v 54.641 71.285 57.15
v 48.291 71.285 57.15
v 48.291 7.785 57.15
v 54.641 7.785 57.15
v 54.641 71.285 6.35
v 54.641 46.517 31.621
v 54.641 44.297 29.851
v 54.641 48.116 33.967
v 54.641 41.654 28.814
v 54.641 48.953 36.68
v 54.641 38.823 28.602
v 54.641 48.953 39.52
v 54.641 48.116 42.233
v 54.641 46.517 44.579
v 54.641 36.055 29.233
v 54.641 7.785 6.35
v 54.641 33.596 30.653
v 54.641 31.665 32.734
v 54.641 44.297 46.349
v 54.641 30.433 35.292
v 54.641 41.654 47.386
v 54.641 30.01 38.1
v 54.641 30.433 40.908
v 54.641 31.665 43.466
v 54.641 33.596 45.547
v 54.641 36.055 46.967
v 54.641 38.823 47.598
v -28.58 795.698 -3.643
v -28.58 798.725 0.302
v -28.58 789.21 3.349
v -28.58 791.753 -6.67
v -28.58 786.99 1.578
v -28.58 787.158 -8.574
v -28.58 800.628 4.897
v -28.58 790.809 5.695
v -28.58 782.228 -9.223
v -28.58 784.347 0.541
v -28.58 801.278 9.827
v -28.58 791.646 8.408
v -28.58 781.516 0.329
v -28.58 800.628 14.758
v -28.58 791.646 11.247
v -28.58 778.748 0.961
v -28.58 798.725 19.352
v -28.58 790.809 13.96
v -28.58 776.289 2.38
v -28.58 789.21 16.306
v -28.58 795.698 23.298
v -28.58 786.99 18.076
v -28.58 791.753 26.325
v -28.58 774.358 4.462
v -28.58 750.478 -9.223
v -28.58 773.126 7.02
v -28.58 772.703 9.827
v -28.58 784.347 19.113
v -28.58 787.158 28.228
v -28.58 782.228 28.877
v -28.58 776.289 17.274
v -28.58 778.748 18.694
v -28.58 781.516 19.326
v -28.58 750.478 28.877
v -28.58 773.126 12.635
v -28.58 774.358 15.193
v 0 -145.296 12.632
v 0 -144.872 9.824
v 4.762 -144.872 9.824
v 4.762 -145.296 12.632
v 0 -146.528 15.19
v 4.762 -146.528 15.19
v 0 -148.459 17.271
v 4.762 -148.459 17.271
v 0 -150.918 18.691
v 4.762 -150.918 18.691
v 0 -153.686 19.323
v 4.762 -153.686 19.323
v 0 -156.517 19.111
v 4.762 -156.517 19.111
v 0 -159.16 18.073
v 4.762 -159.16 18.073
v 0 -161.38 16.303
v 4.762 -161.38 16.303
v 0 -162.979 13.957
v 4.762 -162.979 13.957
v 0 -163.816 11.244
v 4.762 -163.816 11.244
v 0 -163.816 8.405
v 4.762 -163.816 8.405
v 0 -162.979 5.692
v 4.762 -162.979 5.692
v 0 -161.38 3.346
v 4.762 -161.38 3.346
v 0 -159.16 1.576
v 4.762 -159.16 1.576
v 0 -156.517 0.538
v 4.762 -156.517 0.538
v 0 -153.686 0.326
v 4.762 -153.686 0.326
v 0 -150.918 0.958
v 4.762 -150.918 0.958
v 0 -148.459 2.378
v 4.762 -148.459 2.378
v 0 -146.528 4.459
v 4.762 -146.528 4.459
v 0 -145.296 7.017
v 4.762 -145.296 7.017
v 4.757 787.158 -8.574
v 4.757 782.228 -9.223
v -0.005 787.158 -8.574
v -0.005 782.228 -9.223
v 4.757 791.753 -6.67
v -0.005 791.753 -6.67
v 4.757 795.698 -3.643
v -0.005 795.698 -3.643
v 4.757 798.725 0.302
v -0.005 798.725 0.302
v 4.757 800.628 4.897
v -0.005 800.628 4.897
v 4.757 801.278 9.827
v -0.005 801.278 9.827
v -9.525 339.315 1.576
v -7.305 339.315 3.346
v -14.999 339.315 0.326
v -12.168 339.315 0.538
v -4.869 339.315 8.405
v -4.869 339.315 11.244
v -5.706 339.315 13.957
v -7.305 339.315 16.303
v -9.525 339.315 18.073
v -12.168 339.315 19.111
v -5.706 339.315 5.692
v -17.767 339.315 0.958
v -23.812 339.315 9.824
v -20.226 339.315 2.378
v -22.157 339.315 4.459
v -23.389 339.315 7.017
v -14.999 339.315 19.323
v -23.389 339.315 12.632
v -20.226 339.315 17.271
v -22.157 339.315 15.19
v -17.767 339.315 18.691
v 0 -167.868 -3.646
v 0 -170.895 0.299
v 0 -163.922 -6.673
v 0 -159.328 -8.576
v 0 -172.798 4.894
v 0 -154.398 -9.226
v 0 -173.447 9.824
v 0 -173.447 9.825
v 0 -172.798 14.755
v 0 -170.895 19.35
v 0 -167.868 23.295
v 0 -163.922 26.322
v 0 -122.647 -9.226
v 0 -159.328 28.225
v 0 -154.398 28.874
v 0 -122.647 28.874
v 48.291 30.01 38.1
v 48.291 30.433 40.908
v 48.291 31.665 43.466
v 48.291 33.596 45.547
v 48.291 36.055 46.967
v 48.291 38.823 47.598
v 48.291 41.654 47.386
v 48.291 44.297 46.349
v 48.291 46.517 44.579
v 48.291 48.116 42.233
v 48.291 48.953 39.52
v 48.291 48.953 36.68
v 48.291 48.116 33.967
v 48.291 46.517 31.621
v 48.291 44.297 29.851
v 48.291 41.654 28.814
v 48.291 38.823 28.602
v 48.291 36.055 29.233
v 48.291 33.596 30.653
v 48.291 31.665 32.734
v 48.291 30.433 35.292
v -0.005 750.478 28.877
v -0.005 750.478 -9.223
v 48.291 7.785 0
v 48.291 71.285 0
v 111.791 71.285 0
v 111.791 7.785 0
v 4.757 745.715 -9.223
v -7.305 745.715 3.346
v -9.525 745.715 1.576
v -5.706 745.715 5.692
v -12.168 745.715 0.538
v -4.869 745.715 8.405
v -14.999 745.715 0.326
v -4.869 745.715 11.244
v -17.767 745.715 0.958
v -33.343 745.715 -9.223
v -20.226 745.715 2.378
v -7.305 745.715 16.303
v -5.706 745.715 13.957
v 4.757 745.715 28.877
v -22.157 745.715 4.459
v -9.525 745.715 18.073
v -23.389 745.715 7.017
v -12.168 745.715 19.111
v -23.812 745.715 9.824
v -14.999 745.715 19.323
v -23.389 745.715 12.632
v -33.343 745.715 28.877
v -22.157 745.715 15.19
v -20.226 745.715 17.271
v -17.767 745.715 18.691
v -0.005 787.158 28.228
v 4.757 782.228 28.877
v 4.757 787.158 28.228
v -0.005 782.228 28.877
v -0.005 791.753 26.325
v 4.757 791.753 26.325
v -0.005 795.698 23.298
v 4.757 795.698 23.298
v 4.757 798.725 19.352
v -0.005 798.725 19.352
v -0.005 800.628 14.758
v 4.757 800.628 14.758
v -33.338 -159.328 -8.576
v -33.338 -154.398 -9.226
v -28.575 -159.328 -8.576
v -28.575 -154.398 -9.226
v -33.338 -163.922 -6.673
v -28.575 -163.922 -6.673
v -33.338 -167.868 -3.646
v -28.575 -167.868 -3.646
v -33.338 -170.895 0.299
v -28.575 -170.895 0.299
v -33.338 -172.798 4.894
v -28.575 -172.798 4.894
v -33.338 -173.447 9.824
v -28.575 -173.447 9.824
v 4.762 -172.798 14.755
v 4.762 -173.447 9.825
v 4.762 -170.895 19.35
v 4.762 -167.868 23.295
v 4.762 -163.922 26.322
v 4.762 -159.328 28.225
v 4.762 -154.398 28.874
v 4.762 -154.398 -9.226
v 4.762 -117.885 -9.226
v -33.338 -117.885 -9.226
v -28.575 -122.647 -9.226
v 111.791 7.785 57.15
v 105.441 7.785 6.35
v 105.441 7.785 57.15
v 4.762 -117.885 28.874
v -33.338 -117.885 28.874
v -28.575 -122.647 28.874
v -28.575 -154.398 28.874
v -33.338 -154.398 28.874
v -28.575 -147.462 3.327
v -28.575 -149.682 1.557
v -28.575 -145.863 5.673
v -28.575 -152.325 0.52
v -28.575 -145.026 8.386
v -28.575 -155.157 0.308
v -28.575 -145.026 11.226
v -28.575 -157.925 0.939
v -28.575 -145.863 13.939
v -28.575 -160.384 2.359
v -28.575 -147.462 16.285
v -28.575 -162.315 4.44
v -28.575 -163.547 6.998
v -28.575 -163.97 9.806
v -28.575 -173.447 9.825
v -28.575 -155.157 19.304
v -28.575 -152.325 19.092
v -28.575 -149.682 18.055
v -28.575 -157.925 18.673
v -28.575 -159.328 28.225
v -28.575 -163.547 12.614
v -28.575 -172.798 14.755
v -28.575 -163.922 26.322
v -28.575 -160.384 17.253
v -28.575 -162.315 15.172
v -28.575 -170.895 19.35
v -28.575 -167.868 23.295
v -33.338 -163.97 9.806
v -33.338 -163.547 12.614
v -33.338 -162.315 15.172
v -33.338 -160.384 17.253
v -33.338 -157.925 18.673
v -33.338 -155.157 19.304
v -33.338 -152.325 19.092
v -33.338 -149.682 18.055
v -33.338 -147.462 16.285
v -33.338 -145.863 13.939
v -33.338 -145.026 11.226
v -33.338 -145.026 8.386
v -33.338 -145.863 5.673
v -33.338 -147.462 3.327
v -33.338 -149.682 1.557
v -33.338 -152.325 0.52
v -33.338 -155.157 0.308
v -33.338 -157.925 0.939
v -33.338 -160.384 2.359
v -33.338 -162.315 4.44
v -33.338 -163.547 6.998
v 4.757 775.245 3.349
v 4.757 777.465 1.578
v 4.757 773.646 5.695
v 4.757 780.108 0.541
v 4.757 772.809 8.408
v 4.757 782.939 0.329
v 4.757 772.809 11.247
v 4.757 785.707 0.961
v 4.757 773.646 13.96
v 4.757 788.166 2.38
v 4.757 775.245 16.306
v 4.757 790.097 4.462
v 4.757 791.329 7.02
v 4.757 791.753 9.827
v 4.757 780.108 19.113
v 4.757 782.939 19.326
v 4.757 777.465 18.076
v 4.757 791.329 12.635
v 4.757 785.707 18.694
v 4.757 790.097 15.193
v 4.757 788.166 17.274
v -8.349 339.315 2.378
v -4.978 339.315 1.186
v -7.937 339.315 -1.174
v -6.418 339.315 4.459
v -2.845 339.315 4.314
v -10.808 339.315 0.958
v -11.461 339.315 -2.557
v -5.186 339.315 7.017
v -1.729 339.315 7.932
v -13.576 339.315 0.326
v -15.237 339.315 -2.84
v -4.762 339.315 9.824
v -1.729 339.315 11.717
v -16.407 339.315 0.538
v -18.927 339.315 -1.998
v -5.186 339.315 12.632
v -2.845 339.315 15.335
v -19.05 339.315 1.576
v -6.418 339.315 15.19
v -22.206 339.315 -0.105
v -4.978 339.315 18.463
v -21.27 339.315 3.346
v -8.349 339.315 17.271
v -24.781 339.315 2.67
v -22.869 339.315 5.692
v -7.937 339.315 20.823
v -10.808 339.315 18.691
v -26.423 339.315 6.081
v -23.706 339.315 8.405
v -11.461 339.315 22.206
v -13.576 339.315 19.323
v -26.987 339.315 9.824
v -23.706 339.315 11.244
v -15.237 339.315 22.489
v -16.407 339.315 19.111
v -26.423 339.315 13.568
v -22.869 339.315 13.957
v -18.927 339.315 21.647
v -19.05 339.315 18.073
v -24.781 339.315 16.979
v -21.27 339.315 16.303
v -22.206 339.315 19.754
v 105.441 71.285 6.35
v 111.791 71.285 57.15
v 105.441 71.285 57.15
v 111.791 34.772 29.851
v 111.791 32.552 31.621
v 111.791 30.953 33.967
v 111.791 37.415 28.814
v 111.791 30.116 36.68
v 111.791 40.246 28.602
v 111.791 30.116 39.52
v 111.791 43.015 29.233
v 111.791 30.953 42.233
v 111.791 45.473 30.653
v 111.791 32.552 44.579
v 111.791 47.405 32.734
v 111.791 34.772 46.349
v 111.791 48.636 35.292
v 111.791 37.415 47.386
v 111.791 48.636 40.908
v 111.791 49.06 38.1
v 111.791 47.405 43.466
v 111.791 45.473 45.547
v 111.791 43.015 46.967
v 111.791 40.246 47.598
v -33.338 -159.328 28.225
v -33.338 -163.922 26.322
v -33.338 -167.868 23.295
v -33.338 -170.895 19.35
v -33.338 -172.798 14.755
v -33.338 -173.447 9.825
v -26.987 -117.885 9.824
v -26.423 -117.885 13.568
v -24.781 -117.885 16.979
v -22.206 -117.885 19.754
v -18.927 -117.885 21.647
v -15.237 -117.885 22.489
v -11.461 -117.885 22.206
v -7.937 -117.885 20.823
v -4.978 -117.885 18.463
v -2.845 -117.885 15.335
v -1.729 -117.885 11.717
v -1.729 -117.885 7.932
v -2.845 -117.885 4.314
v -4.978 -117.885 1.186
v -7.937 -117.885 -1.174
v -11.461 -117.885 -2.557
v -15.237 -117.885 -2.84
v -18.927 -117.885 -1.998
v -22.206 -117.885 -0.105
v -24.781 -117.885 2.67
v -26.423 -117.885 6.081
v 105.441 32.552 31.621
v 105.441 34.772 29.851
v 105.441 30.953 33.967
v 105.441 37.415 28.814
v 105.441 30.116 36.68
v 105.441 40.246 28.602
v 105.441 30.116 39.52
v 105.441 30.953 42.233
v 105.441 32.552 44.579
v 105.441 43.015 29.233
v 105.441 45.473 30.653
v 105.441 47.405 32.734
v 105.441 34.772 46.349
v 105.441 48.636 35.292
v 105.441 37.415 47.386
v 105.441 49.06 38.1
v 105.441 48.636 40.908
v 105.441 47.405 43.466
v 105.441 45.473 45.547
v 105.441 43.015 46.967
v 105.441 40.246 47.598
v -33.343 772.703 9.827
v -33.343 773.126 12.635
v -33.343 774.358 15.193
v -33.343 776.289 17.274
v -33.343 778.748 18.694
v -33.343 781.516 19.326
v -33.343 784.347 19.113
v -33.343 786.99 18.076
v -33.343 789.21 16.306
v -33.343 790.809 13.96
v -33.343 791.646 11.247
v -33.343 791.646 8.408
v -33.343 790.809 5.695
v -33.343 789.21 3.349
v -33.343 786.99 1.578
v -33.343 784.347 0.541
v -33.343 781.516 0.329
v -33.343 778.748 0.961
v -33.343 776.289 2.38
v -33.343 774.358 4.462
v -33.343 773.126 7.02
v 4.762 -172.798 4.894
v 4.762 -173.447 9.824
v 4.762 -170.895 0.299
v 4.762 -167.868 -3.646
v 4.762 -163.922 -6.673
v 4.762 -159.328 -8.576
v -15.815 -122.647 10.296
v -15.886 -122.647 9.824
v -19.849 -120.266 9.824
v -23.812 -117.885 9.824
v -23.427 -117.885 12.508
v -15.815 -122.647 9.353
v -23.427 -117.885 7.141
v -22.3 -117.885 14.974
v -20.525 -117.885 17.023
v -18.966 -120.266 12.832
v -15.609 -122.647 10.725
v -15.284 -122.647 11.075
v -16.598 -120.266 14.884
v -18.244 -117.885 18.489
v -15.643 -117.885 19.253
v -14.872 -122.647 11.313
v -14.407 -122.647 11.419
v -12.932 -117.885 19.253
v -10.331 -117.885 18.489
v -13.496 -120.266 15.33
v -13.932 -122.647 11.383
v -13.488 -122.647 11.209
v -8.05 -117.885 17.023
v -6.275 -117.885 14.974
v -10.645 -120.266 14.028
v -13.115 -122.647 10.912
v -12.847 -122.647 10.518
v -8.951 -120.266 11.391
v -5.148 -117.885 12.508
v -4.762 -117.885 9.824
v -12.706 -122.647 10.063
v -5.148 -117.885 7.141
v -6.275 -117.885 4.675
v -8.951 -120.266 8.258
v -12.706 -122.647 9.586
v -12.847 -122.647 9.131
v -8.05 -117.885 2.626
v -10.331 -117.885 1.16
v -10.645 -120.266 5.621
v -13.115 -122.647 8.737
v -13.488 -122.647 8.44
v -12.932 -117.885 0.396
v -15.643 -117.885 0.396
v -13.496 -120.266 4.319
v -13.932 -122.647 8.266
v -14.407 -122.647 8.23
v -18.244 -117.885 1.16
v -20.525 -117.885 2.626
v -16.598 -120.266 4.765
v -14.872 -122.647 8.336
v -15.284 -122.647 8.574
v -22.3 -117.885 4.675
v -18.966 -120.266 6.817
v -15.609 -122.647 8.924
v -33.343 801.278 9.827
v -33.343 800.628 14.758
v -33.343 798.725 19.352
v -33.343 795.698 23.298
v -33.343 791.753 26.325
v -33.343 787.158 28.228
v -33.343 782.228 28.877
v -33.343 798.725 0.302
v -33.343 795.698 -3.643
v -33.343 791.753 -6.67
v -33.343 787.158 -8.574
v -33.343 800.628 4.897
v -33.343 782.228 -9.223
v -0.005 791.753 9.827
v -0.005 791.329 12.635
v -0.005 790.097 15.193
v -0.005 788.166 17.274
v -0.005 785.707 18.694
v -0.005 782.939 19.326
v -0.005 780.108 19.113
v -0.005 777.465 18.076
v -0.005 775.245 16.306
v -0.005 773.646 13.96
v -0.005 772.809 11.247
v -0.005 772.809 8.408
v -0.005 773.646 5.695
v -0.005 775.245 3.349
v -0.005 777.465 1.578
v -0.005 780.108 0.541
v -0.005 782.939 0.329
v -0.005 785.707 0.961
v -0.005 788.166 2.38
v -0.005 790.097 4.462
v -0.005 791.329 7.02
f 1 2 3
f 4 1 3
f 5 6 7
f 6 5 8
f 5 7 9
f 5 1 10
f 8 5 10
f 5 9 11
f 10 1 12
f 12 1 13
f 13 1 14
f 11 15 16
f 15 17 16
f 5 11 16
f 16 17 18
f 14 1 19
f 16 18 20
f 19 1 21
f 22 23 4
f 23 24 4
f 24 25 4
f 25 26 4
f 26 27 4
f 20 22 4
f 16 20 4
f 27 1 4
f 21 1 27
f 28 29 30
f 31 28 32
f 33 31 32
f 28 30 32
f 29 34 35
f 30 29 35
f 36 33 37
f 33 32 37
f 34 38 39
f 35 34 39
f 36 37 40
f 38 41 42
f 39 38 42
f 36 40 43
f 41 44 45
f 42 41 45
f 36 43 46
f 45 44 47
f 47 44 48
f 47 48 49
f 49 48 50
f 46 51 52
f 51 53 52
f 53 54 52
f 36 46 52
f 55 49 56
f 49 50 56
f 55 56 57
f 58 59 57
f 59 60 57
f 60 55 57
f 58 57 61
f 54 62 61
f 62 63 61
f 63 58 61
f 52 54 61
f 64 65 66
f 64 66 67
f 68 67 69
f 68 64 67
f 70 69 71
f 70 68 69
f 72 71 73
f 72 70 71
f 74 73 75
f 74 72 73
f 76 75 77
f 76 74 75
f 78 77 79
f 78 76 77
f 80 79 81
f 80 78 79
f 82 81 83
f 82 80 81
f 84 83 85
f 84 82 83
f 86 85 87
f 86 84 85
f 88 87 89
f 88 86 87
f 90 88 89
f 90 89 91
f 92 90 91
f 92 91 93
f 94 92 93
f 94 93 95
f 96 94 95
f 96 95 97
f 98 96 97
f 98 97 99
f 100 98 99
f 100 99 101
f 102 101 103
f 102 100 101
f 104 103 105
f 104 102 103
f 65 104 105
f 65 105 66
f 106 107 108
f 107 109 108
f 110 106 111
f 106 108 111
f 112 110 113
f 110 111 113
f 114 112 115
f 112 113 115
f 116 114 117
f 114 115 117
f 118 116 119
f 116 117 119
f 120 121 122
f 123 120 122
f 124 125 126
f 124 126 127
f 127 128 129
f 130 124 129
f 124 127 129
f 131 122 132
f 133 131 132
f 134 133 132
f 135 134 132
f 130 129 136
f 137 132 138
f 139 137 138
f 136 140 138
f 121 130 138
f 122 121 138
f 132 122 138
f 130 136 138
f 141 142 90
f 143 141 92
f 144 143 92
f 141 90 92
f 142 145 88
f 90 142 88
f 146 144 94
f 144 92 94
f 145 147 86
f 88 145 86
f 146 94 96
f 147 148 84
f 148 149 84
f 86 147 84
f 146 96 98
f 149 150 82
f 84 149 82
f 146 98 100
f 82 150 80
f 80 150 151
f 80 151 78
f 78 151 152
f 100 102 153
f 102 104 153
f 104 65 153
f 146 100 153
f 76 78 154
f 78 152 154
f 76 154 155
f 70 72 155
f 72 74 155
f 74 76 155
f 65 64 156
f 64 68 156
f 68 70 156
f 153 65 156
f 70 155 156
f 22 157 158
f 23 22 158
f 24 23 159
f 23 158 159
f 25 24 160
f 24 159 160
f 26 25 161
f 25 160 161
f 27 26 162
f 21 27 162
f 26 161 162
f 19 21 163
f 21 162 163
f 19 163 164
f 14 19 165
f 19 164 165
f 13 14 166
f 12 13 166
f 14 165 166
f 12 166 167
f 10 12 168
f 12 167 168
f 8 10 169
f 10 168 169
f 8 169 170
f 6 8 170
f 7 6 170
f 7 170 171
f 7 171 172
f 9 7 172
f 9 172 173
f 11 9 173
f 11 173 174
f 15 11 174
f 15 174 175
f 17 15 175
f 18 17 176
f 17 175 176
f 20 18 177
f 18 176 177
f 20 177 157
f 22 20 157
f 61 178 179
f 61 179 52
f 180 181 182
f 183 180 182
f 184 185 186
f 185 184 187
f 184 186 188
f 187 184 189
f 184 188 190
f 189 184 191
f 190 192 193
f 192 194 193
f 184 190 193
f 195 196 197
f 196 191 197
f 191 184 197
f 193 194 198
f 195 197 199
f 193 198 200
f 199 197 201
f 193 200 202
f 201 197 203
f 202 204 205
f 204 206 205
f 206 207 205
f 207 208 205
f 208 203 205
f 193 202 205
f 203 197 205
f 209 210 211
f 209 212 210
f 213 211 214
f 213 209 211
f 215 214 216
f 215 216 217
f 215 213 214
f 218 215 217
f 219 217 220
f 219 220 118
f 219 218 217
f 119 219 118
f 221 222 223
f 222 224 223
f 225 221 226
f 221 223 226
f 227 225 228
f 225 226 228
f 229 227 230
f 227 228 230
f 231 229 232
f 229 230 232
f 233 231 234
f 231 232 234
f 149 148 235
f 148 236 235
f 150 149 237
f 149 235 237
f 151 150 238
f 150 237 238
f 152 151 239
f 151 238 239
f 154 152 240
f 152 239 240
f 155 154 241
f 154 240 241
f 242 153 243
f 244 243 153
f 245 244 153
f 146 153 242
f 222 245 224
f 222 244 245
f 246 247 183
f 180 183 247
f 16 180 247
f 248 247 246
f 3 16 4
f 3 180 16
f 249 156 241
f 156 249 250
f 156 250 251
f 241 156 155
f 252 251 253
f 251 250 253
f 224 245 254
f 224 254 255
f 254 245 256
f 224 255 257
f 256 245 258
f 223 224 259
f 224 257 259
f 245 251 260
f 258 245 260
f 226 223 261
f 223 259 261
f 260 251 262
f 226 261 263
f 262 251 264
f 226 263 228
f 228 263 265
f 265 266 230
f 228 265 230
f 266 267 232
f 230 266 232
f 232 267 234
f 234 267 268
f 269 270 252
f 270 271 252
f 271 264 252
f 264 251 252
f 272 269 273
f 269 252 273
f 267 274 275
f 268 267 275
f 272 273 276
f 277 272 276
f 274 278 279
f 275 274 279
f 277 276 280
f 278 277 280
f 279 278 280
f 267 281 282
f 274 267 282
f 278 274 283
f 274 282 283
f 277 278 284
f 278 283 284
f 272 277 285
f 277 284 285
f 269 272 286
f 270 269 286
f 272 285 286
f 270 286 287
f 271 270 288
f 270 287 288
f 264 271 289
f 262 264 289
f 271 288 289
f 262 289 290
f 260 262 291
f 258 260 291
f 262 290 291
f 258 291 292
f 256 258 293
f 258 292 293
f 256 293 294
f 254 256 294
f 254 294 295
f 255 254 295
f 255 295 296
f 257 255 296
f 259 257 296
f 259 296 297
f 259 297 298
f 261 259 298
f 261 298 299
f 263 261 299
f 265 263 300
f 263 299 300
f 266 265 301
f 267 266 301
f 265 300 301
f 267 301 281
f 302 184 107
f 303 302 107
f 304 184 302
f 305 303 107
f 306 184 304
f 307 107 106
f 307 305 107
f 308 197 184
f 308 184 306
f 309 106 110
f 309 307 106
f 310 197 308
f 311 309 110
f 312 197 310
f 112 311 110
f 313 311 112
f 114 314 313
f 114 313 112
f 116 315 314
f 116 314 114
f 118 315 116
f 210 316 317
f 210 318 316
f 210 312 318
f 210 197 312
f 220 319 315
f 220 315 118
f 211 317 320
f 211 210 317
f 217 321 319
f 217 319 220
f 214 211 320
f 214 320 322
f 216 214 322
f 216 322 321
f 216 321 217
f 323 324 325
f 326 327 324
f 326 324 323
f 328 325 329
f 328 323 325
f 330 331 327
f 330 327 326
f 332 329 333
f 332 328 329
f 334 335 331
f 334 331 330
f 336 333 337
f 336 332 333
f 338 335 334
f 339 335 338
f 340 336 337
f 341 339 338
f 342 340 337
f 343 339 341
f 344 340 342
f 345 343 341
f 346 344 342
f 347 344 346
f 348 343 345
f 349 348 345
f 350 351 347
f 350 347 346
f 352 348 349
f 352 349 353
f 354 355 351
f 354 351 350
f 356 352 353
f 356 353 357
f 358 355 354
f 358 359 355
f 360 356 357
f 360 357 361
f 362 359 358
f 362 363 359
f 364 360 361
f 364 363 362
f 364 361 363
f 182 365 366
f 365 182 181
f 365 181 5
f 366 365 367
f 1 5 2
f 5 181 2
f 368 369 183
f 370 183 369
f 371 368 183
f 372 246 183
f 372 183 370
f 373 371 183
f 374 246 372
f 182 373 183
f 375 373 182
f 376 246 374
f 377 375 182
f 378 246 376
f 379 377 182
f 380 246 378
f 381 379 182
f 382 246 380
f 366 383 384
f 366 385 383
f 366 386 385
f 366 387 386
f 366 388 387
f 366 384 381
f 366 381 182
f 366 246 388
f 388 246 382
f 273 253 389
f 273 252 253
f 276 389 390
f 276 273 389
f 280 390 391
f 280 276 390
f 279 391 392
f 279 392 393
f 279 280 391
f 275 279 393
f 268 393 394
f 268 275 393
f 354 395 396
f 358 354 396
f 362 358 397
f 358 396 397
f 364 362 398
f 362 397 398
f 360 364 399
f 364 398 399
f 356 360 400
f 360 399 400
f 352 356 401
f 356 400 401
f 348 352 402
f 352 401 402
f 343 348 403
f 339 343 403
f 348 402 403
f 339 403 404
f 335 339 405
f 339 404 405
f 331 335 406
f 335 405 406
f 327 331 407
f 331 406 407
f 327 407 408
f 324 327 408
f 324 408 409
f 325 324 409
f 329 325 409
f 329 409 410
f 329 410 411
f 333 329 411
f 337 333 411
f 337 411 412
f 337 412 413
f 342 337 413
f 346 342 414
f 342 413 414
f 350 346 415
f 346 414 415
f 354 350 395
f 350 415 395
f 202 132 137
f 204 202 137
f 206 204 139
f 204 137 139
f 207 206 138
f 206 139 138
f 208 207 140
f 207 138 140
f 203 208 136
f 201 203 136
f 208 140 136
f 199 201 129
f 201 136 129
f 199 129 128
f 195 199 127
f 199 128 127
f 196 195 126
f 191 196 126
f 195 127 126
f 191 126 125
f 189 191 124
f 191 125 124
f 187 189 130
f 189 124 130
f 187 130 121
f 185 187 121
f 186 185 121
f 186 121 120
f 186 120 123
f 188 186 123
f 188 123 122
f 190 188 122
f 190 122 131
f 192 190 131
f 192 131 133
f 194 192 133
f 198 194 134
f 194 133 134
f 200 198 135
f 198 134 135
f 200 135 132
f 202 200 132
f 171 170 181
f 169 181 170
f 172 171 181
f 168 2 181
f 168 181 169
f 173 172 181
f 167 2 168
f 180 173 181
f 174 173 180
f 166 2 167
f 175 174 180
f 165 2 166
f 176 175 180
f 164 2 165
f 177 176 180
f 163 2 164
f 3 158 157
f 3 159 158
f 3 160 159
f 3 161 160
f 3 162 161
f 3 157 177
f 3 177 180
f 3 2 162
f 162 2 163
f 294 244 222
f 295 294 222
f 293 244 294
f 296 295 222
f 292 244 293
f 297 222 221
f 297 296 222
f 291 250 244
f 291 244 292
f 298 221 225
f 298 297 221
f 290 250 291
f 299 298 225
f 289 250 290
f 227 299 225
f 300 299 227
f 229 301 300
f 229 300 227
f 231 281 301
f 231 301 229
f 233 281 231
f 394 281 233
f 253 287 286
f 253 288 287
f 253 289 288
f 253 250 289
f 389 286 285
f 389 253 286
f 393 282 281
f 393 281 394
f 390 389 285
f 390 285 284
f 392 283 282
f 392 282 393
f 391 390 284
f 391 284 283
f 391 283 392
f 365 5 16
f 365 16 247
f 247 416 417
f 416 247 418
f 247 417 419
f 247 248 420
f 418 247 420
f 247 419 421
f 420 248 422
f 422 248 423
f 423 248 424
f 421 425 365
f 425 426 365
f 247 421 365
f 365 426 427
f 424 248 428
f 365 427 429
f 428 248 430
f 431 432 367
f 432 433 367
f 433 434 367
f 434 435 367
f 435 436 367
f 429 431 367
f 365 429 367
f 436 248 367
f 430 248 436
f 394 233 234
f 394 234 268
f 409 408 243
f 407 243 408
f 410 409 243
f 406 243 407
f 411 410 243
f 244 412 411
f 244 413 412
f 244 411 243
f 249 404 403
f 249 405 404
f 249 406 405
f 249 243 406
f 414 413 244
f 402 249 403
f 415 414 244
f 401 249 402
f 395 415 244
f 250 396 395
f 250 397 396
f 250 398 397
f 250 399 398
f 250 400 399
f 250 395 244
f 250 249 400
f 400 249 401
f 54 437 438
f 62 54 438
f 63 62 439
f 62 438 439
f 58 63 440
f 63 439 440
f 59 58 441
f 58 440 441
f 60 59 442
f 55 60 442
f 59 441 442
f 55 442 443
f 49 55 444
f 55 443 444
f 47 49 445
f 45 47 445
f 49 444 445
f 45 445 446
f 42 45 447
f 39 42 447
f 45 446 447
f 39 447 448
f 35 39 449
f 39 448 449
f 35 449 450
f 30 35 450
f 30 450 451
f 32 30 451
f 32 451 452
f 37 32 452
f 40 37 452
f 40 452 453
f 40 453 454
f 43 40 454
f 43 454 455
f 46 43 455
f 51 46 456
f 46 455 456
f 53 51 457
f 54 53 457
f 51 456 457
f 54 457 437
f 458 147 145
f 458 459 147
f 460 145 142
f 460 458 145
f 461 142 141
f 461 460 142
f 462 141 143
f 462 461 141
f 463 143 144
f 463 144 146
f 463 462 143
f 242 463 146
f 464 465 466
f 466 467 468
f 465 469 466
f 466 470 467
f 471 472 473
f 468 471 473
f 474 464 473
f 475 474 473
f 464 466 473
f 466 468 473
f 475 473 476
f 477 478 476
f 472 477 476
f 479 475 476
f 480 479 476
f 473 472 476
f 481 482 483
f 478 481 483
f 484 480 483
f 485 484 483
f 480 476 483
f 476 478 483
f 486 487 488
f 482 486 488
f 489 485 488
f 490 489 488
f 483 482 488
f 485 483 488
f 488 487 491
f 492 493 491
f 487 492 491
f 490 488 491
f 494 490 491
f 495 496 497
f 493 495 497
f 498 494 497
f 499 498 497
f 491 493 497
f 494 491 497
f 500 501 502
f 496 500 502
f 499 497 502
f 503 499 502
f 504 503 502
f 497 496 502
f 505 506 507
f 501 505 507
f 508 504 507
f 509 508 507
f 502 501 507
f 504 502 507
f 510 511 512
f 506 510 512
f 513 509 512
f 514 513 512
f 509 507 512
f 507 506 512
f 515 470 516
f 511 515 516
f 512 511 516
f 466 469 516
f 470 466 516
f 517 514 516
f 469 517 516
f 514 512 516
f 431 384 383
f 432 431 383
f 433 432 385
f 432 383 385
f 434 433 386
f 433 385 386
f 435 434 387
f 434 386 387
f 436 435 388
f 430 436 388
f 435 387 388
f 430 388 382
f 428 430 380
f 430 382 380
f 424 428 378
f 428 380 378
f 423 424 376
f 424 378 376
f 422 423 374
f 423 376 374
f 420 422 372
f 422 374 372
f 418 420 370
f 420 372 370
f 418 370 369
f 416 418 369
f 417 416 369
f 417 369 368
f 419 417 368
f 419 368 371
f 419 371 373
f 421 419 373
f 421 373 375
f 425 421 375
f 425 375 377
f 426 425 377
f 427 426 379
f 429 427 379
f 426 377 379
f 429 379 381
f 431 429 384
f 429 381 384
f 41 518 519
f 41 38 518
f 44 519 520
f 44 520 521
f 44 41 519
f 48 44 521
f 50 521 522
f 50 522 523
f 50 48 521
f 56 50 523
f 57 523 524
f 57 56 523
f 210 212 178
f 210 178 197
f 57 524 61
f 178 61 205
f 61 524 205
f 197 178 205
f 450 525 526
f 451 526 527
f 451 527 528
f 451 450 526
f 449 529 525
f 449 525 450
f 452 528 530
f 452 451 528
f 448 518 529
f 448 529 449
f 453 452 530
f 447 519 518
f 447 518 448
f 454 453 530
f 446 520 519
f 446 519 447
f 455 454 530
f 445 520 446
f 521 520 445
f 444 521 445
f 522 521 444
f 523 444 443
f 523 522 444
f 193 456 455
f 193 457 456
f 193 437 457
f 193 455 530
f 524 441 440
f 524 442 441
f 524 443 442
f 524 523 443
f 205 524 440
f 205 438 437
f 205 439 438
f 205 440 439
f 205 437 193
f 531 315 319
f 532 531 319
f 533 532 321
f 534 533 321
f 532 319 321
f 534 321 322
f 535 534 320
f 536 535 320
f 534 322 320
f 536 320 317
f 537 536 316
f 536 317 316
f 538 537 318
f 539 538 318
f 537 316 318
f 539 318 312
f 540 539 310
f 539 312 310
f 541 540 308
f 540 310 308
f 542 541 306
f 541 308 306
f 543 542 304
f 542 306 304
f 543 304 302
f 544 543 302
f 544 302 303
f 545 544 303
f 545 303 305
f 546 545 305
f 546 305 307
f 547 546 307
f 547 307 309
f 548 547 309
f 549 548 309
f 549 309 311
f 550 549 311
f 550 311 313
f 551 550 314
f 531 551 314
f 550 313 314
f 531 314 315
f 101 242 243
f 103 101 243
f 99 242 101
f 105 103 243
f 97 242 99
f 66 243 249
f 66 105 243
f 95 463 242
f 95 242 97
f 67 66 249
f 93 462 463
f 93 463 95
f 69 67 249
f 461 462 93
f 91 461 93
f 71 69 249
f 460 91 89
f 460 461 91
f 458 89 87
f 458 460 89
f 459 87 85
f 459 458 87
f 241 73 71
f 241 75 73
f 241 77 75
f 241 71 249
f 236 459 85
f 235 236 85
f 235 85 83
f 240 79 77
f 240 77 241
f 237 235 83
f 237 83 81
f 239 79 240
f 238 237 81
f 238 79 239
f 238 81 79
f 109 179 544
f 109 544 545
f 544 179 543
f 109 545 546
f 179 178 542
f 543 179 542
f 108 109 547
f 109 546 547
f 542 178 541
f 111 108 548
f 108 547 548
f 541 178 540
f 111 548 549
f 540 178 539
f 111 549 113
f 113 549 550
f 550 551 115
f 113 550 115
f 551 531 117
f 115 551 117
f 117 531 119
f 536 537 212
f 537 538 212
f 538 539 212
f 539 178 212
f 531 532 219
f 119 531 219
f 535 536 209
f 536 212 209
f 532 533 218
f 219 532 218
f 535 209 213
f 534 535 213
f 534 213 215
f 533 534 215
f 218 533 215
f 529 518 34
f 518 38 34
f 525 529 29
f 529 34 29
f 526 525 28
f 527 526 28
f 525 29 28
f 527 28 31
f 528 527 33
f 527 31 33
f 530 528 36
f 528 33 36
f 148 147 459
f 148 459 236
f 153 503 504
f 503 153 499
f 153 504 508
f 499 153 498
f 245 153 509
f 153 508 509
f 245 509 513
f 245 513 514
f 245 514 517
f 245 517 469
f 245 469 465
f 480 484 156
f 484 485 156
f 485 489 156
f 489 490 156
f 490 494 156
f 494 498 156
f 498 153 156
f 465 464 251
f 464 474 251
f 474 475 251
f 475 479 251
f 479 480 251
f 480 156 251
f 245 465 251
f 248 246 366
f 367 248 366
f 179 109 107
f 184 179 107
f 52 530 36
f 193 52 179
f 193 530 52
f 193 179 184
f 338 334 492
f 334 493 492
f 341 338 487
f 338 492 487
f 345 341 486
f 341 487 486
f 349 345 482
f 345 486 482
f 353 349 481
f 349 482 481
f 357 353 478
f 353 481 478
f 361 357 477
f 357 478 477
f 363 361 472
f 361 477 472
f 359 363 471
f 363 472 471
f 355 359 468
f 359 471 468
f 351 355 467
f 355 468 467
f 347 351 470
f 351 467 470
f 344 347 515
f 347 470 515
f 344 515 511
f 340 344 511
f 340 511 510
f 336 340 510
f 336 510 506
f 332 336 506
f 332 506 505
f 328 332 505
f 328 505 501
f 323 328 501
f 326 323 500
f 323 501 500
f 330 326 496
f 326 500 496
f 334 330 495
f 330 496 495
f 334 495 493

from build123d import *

# Parameters (mm, degrees)
F0_W      = 50.8
F0_H      = 38.1
F0_R      = 9.525
F1_DEPTH  = 4.7625
F2_R      = 19.04999
F3_W      = 33.3375
F3_H      = 38.1
F3_W_2    = 4.7625
F4_DEPTH  = 4.7625
F5_W      = 50.8
F5_H      = 38.1
F5_R      = 9.525
F6_DEPTH  = 4.7625
F7_R      = 19.04999
F8_R      = 12.7
F9_DEPTH  = 457.2
F11_D     = 19.05
F11_DEPTH = 457.2
F11_TIP   = 5.7231973962
F12_R     = 9.525
F13_DEPTH = 406.4
F14_W     = 38.1
F14_H     = 38.1
F14_R     = 9.525
F15_DEPTH = 4.7625
F16_W     = 50.8
F16_H     = 38.1
F16_R     = 9.525
F17_DEPTH = 4.7625
F18_R     = 19.04999
F19_W     = 50.8
F19_H     = 38.1
F19_R     = 9.525
F20_DEPTH = 4.7625
F21_R     = 19.04999
F22_W     = 63.5
F22_H     = 63.5
F23_DEPTH = 6.35
F24_W     = 63.5
F24_H     = 50.8
F24_R     = 9.525
F25_DEPTH = 6.35
F26_W     = 63.5
F26_H     = 50.8
F26_R     = 9.525
F27_DEPTH = 6.35


# Not quite as in the source:
# - a fillet or chamfer is up to 0.001 mm smaller than in the source, because OpenCascade refuses the exact size


with BuildPart() as f1:
    # F0 (on Right) → F1 (new body)
    with BuildSketch(Plane.YZ):
        with Locations((-148.0474919081, 9.8244957626)):
            Rectangle(F0_W, F0_H)
        with Locations((-154.3974919081, 9.8244957626)):
            Circle(F0_R, mode=Mode.SUBTRACT)
    extrude(amount=F1_DEPTH)

    # F2 (radius 19.05 in the source; OpenCascade refuses exactly that, so slightly less here)
    f2_edges = [f1.edges().sort_by_distance(p)[0] for p in [
        (2.38125, -173.447492, 28.874496),
        (2.38125, -173.447492, -9.225504),
    ]]
    fillet(f2_edges, radius=F2_R)

    # F3 (on face) → F4 (join)
    with BuildSketch(Plane(origin=(0, -122.6474919081, 0), x_dir=(-1, 0, 0), z_dir=(0, 1, 0))):
        with Locations((16.66875, 9.8244957626)):
            Rectangle(F3_W, F3_H)
        with Locations((-2.38125, 9.8244957626)):
            Rectangle(F3_W_2, F3_H)
    extrude(amount=F4_DEPTH)

    # F5 (on face) → F6 (join)
    with BuildSketch(Plane(origin=(-33.3375, 0, 0), x_dir=(0, -1, 0), z_dir=(-1, 0, 0))):
        with Locations((148.0474919081, 9.8244957626)):
            Rectangle(F5_W, F5_H)
        with Locations((154.4447690248, 9.8060360178)):
            Circle(F5_R, mode=Mode.SUBTRACT)
    extrude(amount=-F6_DEPTH)

    # F7 (radius 19.05 in the source; OpenCascade refuses exactly that, so slightly less here)
    f7_edges = [f1.edges().sort_by_distance(p)[0] for p in [
        (-30.95625, -173.447492, 28.874496),
        (-30.95625, -173.447492, -9.225504),
    ]]
    fillet(f7_edges, radius=F7_R)

    # F8 (on face) → F9 (join)
    with BuildSketch(Plane(origin=(0, -117.8849919081, 0), x_dir=(-1, 0, 0), z_dir=(0, 1, 0))):
        with Locations((14.2875, 9.8244957626)):
            Circle(F8_R)
    extrude(amount=F9_DEPTH)

    # F11
    with Locations(Plane(origin=(0, 339.3150080919, 0), x_dir=(-1, 0, 0), z_dir=(0, 1, 0))):
        with Locations((14.2875, 9.8244957626)):
            Hole(F11_D / 2, depth=F11_DEPTH)
            with Locations((0, 0, -(F11_DEPTH + F11_TIP / 2))):  # 118° drill point
                Cone(0, F11_D / 2, F11_TIP, mode=Mode.SUBTRACT)


with BuildPart() as f13:
    # F12 (on face) → F13 (new body)
    with BuildSketch(Plane(origin=(0, 339.3150080919, 0), x_dir=(-1, 0, 0), z_dir=(0, 1, 0))):
        with Locations((14.2875, 9.8244957626)):
            Circle(F12_R)
    extrude(amount=F13_DEPTH)

    # F14 (on face) → F15 (join)
    with BuildSketch(Plane(origin=(0, 745.7150080919, 0), x_dir=(-1, 0, 0), z_dir=(0, 1, 0))):
        with Locations((14.2927456155, 9.8272960141)):
            Rectangle(F14_W, F14_H)
        with Locations((14.2875, 9.8244957626)):
            Circle(F14_R, mode=Mode.SUBTRACT)
        with Locations((14.2875, 9.8244957626)):
            Circle(F14_R)
    extrude(amount=F15_DEPTH)

    # F16 (on face) → F17 (join)
    with BuildSketch(Plane.YZ.offset(4.7572543845)):
        with Locations((775.8775080919, 9.8272960141)):
            Rectangle(F16_W, F16_H)
        with Locations((782.2275080919, 9.8272960141)):
            Circle(F16_R, mode=Mode.SUBTRACT)
    extrude(amount=-F17_DEPTH)

    # F18 (radius 19.05 in the source; OpenCascade refuses exactly that, so slightly less here)
    f18_edges = [f13.edges().sort_by_distance(p)[0] for p in [
        (2.376004, 801.277508, 28.877296),
        (2.376004, 801.277508, -9.222704),
    ]]
    fillet(f18_edges, radius=F18_R)

    # F19 (on face) → F20 (join)
    with BuildSketch(Plane(origin=(-33.3427456155, 0, 0), x_dir=(0, -1, 0), z_dir=(-1, 0, 0))):
        with Locations((-775.8775080919, 9.8272960141)):
            Rectangle(F19_W, F19_H)
        with Locations((-782.2275080919, 9.8272960141)):
            Circle(F19_R, mode=Mode.SUBTRACT)
    extrude(amount=-F20_DEPTH)

    # F21 (radius 19.05 in the source; OpenCascade refuses exactly that, so slightly less here)
    f21_edges = [f13.edges().sort_by_distance(p)[0] for p in [
        (-30.961496, 801.277508, 28.877296),
        (-30.961496, 801.277508, -9.222704),
    ]]
    fillet(f21_edges, radius=F21_R)


with BuildPart() as f23:
    # F22 (on Top) → F23 (new body)
    with BuildSketch(Plane.XY):
        with Locations((80.0405043066, 39.5346571803)):
            Rectangle(F22_W, F22_H)
    extrude(amount=F23_DEPTH)

    # F24 (on face) → F25 (join)
    with BuildSketch(Plane.YZ.offset(111.7905043066)):
        with Locations((39.5346571803, 31.75)):
            Rectangle(F24_W, F24_H)
        with Locations((39.5346571803, 38.1)):
            Circle(F24_R, mode=Mode.SUBTRACT)
    extrude(amount=-F25_DEPTH)

    # F26 (on face) → F27 (join)
    with BuildSketch(Plane(origin=(48.2905043066, 0, 0), x_dir=(0, -1, 0), z_dir=(-1, 0, 0))):
        with Locations((-39.5346571803, 31.75)):
            Rectangle(F26_W, F26_H)
        with Locations((-39.5346571803, 38.1)):
            Circle(F26_R, mode=Mode.SUBTRACT)
    extrude(amount=-F27_DEPTH)


solid = Compound([f1.part, f13.part, f23.part])
